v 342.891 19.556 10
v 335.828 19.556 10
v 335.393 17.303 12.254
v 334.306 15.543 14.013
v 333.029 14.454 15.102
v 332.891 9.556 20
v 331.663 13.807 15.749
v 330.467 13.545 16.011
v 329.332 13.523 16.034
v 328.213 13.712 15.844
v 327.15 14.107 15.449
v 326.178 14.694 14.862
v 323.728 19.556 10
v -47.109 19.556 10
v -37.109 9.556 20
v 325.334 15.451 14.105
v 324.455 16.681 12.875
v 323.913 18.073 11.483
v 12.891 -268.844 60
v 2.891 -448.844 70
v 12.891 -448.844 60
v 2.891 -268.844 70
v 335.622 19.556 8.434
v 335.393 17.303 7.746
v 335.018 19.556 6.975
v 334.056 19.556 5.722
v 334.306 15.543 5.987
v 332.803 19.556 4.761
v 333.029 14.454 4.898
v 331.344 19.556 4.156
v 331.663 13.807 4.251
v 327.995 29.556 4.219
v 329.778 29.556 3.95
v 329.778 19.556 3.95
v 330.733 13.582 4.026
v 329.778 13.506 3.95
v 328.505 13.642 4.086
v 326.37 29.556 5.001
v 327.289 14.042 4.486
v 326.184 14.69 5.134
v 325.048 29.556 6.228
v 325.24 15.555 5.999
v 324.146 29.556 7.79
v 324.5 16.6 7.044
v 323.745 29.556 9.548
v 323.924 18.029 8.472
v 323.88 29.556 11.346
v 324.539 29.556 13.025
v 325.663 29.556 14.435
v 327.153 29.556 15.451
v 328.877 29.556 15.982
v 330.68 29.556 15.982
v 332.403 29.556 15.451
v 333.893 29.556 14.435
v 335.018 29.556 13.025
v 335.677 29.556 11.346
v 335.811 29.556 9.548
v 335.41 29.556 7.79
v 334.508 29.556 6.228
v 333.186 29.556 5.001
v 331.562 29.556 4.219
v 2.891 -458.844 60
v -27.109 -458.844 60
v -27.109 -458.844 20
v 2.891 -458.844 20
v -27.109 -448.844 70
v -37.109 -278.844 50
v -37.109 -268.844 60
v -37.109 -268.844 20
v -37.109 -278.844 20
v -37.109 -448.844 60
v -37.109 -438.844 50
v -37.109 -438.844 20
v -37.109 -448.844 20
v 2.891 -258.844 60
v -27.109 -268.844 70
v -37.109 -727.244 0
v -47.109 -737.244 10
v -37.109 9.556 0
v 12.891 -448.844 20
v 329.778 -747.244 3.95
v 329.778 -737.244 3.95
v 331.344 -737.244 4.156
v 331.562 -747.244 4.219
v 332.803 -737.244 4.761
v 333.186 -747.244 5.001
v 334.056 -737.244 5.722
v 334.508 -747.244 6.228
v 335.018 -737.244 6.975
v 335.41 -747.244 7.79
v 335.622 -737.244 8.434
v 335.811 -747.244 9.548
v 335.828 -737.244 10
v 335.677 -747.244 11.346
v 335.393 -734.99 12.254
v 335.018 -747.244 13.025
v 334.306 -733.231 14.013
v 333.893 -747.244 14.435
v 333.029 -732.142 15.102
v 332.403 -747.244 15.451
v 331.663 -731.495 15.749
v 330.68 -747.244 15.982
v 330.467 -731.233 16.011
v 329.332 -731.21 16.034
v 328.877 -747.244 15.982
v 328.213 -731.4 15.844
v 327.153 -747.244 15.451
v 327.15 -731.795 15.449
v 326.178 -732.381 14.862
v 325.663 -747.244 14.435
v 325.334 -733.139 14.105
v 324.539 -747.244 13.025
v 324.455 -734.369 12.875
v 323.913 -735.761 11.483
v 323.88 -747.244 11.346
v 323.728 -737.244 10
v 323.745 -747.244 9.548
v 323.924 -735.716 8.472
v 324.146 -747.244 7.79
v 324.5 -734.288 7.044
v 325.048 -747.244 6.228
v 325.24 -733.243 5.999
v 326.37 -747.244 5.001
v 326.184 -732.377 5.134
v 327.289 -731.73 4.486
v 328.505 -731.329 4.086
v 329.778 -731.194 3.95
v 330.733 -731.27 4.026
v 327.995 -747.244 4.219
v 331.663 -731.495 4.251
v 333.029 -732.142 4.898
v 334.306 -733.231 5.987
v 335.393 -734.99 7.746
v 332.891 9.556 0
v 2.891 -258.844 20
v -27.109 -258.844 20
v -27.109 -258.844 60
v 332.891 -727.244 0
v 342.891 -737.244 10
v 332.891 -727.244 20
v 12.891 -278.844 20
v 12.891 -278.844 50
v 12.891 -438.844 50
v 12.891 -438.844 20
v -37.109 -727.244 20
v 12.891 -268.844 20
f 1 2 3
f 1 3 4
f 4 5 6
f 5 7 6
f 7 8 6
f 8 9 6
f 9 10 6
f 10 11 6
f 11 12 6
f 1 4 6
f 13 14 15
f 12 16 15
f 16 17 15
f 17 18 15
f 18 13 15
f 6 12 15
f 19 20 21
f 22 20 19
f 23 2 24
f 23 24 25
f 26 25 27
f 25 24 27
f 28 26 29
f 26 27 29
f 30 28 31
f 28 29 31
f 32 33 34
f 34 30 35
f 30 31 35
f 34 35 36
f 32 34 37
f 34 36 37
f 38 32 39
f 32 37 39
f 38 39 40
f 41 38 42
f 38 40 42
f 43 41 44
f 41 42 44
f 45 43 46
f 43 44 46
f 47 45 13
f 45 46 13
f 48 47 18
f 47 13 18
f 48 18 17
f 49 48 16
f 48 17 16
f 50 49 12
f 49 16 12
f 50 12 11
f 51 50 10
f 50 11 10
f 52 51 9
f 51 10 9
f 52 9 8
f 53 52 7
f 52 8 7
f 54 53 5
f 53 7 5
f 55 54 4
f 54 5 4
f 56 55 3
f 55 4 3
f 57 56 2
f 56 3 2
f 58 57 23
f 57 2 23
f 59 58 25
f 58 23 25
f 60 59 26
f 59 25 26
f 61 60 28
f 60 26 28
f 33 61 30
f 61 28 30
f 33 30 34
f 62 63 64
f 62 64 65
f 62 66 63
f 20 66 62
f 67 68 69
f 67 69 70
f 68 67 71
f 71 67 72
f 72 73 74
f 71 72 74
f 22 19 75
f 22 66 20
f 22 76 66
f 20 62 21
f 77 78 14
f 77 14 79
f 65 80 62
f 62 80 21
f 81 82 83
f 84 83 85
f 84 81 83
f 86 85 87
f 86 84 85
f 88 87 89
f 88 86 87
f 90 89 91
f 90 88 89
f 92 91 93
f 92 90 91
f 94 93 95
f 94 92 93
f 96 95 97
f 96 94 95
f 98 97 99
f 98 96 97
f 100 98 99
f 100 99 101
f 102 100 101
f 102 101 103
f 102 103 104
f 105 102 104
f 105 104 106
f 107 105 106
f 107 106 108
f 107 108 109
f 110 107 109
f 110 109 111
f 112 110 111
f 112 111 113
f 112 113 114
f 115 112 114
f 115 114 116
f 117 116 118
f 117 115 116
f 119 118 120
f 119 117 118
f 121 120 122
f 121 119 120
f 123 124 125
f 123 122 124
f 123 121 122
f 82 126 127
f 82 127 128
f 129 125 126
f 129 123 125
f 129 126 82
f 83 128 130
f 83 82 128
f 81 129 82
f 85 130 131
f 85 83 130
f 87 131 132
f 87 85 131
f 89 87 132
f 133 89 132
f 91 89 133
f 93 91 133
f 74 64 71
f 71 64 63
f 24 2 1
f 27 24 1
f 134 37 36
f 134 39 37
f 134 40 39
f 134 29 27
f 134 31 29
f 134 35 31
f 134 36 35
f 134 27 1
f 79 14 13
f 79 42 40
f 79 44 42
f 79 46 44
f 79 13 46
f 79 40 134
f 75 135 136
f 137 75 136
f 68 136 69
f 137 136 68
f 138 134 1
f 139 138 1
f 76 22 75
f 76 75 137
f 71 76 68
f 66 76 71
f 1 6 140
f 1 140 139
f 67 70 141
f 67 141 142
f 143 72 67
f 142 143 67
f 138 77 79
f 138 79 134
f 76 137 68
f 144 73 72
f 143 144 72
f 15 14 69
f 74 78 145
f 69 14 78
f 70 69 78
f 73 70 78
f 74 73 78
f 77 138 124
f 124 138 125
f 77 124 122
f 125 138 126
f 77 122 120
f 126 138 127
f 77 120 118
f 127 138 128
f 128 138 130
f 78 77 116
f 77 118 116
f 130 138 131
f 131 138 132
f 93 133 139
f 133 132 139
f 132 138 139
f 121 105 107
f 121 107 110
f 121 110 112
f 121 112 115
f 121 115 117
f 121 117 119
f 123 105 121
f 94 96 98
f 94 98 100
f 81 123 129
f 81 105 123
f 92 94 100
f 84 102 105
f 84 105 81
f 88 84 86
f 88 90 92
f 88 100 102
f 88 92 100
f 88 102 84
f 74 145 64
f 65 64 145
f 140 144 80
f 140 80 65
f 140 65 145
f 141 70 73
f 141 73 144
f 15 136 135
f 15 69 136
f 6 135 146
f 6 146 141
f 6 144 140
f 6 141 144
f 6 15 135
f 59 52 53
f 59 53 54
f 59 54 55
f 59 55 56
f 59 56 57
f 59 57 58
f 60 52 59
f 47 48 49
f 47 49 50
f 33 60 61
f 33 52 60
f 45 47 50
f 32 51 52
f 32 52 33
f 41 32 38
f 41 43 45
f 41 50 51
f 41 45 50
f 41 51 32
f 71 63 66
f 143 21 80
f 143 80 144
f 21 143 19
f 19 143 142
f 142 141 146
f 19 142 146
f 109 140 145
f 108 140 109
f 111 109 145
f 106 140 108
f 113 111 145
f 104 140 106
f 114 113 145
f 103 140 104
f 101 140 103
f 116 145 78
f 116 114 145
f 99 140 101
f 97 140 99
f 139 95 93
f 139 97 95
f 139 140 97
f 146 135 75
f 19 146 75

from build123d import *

# Parameters (mm, degrees)
SKETCH1_W           = 390
SKETCH1_H           = 756.8
BOSS_EXTRUDE1_DEPTH = 20
SKETCH2_R           = 6.05
BOSS_EXTRUDE2_DEPTH = 10
BOSS_EXTRUDE3_START = 10
SKETCH3_R           = 6.05
BOSS_EXTRUDE3_DEPTH = 10
CHAMFER1_SIZE       = 10
BOSS_EXTRUDE4_DEPTH = 50
SKETCH5_W           = 30
SKETCH5_H           = 160
CUT_EXTRUDE1_DEPTH  = 131
CHAMFER2_SIZE       = 10


with BuildPart() as part:
    # Sketch1 → Boss-Extrude1 (new body)
    with BuildSketch(Plane.XY):
        with Locations((147.890593688, -358.84384058)):
            Rectangle(SKETCH1_W, SKETCH1_H)
    extrude(amount=BOSS_EXTRUDE1_DEPTH)

    # Sketch2 → Boss-Extrude2 (add)
    with BuildSketch(Plane(origin=(0, 19.55615942, 0), x_dir=(1, 0, 0), z_dir=(0, 1, 0))):
        with Locations(Location((329.77827945, -10, 0), (0, 0, 90))):
            Circle(SKETCH2_R)
    extrude(amount=BOSS_EXTRUDE2_DEPTH)

    # Sketch3 → Boss-Extrude3 (add)
    with BuildSketch(Plane.XZ.offset(737.24384058).offset(BOSS_EXTRUDE3_START)):
        with Locations(Location((329.77827945, 10, 0), (0, 0, 270))):
            Circle(SKETCH3_R)
    extrude(amount=-BOSS_EXTRUDE3_DEPTH)

    # Chamfer1
    # the kernel refuses this chamfer: 10 mm, written as the material it takes off along each edge
    with BuildSketch(Plane(origin=(368.607423567, -737.24384058, 0), x_dir=(0, 0.9996219169112968, -0.027495876610586487), z_dir=(-1, 0, 0))) as chamfer1_piece_1_section:
        Polygon((CHAMFER1_SIZE * 0.999621916911, -CHAMFER1_SIZE * 0.0274958766106), (-CHAMFER1_SIZE * 0.0274958766106, -CHAMFER1_SIZE * 0.999621916911), (0, 0), align=None)
    chamfer1_piece_1 = extrude(amount=441.433659759, mode=Mode.PRIVATE)
    chamfer1_piece_1 = chamfer1_piece_1 - Plane(origin=(329.77827945, -733.933944157, 10), x_dir=(0, 0, -1), z_dir=(0, -1, 0)) * Cylinder(6.05, 923, mode=Mode.PRIVATE)
    add(chamfer1_piece_1, mode=Mode.SUBTRACT)
    with BuildSketch(Plane(origin=(-47.109406312, -762.960670459, 0), x_dir=(-0.027495876610586317, 0, 0.9996219169112968), z_dir=(0, 1, 0)), Plane(origin=(342.890593688, 45.2729893, 20), x_dir=(-0.9996219169112968, 0, 0.027495876610586282), z_dir=(0, -1, 0))) as chamfer1_piece_2:
        Polygon((CHAMFER1_SIZE * 0.999621916911, CHAMFER1_SIZE * 0.0274958766106), (-CHAMFER1_SIZE * 0.0274958766106, CHAMFER1_SIZE * 0.999621916911), (0, 0), align=None)
    extrude(amount=808.233659759, mode=Mode.SUBTRACT)
    with BuildSketch(Plane(origin=(-72.826236192, 19.55615942, 0), x_dir=(0, 0.027495876610586317, 0.9996219169112968), z_dir=(1, 0, 0))) as chamfer1_piece_3_section:
        Polygon((CHAMFER1_SIZE * 0.999621916911, CHAMFER1_SIZE * 0.0274958766106), (-CHAMFER1_SIZE * 0.0274958766106, CHAMFER1_SIZE * 0.999621916911), (0, 0), align=None)
    chamfer1_piece_3 = extrude(amount=441.433659759, mode=Mode.PRIVATE)
    chamfer1_piece_3 = chamfer1_piece_3 - Plane(origin=(329.77827945, 16.24626296, 10), x_dir=(0, 0, -1), z_dir=(0, -1, 0)) * Cylinder(6.05, 923, mode=Mode.PRIVATE)
    add(chamfer1_piece_3, mode=Mode.SUBTRACT)
    with BuildSketch(Plane(origin=(342.890593688, 45.2729893, 0), x_dir=(-0.9996219169112968, 0, -0.027495876610586334), z_dir=(0, -1, 0)), Plane(origin=(-47.109406312, -762.960670459, 20), x_dir=(-0.027495876610586317, 0, -0.9996219169112968), z_dir=(0, 1, 0))) as chamfer1_piece_4:
        Polygon((CHAMFER1_SIZE * 0.999621916911, -CHAMFER1_SIZE * 0.0274958766106), (-CHAMFER1_SIZE * 0.0274958766106, -CHAMFER1_SIZE * 0.999621916911), (0, 0), align=None)
    extrude(amount=808.233659759, mode=Mode.SUBTRACT)
    with BuildSketch(Plane(origin=(368.607423567, -737.24384058, 20), x_dir=(0, 0.9996219169112968, 0.02749587661058643), z_dir=(-1, 0, 0))) as chamfer1_piece_5_section:
        Polygon((CHAMFER1_SIZE * 0.999621916911, CHAMFER1_SIZE * 0.0274958766106), (-CHAMFER1_SIZE * 0.0274958766106, CHAMFER1_SIZE * 0.999621916911), (0, 0), align=None)
    chamfer1_piece_5 = extrude(amount=441.433659759, mode=Mode.PRIVATE)
    chamfer1_piece_5 = chamfer1_piece_5 - Plane(origin=(329.77827945, -733.933944133, 10), x_dir=(0, 0, -1), z_dir=(0, -1, 0)) * Cylinder(6.05, 923, mode=Mode.PRIVATE)
    add(chamfer1_piece_5, mode=Mode.SUBTRACT)
    with BuildSketch(Plane(origin=(-72.826236192, 19.55615942, 20), x_dir=(0, 0.027495876610586317, -0.9996219169112968), z_dir=(1, 0, 0))) as chamfer1_piece_6_section:
        Polygon((CHAMFER1_SIZE * 0.999621916911, -CHAMFER1_SIZE * 0.0274958766106), (-CHAMFER1_SIZE * 0.0274958766106, -CHAMFER1_SIZE * 0.999621916911), (0, 0), align=None)
    chamfer1_piece_6 = extrude(amount=441.433659759, mode=Mode.PRIVATE)
    chamfer1_piece_6 = chamfer1_piece_6 - Plane(origin=(329.77827945, 16.246262993, 10), x_dir=(0, 0, -1), z_dir=(0, -1, 0)) * Cylinder(6.05, 923, mode=Mode.PRIVATE)
    add(chamfer1_piece_6, mode=Mode.SUBTRACT)

    # Sketch4 → Boss-Extrude4 (add)
    with BuildSketch(Plane.XY.offset(20)):
        Polygon((12.890593688, -358.84384058), (12.890593688, -258.84384058), (-37.109406312, -258.84384058), (-37.109406312, -458.84384058), (12.890593688, -458.84384058), align=None)
    extrude(amount=BOSS_EXTRUDE4_DEPTH)

    # Sketch5 → Cut-Extrude1 (cut)
    with BuildSketch(Plane.ZY.offset(37.109406312)):
        with Locations((35, -358.84384058)):
            Rectangle(SKETCH5_W, SKETCH5_H)
    extrude(amount=-CUT_EXTRUDE1_DEPTH, mode=Mode.SUBTRACT)

    # Chamfer2
    chamfer2_edges = [part.edges().sort_by_distance(p)[0] for p in [
        (-37.109406312, -458.84384058, 45),
        (12.890593688, -458.84384058, 45),
        (12.890593688, -258.84384058, 45),
        (-37.109406312, -258.84384058, 45),
        (-12.109406312, -458.84384058, 70),
        (12.890593688, -358.84384058, 70),
        (-12.109406312, -258.84384058, 70),
        (-37.109406312, -358.84384058, 70),
    ]]
    chamfer(chamfer2_edges, length=CHAMFER2_SIZE)


solid = part.part
